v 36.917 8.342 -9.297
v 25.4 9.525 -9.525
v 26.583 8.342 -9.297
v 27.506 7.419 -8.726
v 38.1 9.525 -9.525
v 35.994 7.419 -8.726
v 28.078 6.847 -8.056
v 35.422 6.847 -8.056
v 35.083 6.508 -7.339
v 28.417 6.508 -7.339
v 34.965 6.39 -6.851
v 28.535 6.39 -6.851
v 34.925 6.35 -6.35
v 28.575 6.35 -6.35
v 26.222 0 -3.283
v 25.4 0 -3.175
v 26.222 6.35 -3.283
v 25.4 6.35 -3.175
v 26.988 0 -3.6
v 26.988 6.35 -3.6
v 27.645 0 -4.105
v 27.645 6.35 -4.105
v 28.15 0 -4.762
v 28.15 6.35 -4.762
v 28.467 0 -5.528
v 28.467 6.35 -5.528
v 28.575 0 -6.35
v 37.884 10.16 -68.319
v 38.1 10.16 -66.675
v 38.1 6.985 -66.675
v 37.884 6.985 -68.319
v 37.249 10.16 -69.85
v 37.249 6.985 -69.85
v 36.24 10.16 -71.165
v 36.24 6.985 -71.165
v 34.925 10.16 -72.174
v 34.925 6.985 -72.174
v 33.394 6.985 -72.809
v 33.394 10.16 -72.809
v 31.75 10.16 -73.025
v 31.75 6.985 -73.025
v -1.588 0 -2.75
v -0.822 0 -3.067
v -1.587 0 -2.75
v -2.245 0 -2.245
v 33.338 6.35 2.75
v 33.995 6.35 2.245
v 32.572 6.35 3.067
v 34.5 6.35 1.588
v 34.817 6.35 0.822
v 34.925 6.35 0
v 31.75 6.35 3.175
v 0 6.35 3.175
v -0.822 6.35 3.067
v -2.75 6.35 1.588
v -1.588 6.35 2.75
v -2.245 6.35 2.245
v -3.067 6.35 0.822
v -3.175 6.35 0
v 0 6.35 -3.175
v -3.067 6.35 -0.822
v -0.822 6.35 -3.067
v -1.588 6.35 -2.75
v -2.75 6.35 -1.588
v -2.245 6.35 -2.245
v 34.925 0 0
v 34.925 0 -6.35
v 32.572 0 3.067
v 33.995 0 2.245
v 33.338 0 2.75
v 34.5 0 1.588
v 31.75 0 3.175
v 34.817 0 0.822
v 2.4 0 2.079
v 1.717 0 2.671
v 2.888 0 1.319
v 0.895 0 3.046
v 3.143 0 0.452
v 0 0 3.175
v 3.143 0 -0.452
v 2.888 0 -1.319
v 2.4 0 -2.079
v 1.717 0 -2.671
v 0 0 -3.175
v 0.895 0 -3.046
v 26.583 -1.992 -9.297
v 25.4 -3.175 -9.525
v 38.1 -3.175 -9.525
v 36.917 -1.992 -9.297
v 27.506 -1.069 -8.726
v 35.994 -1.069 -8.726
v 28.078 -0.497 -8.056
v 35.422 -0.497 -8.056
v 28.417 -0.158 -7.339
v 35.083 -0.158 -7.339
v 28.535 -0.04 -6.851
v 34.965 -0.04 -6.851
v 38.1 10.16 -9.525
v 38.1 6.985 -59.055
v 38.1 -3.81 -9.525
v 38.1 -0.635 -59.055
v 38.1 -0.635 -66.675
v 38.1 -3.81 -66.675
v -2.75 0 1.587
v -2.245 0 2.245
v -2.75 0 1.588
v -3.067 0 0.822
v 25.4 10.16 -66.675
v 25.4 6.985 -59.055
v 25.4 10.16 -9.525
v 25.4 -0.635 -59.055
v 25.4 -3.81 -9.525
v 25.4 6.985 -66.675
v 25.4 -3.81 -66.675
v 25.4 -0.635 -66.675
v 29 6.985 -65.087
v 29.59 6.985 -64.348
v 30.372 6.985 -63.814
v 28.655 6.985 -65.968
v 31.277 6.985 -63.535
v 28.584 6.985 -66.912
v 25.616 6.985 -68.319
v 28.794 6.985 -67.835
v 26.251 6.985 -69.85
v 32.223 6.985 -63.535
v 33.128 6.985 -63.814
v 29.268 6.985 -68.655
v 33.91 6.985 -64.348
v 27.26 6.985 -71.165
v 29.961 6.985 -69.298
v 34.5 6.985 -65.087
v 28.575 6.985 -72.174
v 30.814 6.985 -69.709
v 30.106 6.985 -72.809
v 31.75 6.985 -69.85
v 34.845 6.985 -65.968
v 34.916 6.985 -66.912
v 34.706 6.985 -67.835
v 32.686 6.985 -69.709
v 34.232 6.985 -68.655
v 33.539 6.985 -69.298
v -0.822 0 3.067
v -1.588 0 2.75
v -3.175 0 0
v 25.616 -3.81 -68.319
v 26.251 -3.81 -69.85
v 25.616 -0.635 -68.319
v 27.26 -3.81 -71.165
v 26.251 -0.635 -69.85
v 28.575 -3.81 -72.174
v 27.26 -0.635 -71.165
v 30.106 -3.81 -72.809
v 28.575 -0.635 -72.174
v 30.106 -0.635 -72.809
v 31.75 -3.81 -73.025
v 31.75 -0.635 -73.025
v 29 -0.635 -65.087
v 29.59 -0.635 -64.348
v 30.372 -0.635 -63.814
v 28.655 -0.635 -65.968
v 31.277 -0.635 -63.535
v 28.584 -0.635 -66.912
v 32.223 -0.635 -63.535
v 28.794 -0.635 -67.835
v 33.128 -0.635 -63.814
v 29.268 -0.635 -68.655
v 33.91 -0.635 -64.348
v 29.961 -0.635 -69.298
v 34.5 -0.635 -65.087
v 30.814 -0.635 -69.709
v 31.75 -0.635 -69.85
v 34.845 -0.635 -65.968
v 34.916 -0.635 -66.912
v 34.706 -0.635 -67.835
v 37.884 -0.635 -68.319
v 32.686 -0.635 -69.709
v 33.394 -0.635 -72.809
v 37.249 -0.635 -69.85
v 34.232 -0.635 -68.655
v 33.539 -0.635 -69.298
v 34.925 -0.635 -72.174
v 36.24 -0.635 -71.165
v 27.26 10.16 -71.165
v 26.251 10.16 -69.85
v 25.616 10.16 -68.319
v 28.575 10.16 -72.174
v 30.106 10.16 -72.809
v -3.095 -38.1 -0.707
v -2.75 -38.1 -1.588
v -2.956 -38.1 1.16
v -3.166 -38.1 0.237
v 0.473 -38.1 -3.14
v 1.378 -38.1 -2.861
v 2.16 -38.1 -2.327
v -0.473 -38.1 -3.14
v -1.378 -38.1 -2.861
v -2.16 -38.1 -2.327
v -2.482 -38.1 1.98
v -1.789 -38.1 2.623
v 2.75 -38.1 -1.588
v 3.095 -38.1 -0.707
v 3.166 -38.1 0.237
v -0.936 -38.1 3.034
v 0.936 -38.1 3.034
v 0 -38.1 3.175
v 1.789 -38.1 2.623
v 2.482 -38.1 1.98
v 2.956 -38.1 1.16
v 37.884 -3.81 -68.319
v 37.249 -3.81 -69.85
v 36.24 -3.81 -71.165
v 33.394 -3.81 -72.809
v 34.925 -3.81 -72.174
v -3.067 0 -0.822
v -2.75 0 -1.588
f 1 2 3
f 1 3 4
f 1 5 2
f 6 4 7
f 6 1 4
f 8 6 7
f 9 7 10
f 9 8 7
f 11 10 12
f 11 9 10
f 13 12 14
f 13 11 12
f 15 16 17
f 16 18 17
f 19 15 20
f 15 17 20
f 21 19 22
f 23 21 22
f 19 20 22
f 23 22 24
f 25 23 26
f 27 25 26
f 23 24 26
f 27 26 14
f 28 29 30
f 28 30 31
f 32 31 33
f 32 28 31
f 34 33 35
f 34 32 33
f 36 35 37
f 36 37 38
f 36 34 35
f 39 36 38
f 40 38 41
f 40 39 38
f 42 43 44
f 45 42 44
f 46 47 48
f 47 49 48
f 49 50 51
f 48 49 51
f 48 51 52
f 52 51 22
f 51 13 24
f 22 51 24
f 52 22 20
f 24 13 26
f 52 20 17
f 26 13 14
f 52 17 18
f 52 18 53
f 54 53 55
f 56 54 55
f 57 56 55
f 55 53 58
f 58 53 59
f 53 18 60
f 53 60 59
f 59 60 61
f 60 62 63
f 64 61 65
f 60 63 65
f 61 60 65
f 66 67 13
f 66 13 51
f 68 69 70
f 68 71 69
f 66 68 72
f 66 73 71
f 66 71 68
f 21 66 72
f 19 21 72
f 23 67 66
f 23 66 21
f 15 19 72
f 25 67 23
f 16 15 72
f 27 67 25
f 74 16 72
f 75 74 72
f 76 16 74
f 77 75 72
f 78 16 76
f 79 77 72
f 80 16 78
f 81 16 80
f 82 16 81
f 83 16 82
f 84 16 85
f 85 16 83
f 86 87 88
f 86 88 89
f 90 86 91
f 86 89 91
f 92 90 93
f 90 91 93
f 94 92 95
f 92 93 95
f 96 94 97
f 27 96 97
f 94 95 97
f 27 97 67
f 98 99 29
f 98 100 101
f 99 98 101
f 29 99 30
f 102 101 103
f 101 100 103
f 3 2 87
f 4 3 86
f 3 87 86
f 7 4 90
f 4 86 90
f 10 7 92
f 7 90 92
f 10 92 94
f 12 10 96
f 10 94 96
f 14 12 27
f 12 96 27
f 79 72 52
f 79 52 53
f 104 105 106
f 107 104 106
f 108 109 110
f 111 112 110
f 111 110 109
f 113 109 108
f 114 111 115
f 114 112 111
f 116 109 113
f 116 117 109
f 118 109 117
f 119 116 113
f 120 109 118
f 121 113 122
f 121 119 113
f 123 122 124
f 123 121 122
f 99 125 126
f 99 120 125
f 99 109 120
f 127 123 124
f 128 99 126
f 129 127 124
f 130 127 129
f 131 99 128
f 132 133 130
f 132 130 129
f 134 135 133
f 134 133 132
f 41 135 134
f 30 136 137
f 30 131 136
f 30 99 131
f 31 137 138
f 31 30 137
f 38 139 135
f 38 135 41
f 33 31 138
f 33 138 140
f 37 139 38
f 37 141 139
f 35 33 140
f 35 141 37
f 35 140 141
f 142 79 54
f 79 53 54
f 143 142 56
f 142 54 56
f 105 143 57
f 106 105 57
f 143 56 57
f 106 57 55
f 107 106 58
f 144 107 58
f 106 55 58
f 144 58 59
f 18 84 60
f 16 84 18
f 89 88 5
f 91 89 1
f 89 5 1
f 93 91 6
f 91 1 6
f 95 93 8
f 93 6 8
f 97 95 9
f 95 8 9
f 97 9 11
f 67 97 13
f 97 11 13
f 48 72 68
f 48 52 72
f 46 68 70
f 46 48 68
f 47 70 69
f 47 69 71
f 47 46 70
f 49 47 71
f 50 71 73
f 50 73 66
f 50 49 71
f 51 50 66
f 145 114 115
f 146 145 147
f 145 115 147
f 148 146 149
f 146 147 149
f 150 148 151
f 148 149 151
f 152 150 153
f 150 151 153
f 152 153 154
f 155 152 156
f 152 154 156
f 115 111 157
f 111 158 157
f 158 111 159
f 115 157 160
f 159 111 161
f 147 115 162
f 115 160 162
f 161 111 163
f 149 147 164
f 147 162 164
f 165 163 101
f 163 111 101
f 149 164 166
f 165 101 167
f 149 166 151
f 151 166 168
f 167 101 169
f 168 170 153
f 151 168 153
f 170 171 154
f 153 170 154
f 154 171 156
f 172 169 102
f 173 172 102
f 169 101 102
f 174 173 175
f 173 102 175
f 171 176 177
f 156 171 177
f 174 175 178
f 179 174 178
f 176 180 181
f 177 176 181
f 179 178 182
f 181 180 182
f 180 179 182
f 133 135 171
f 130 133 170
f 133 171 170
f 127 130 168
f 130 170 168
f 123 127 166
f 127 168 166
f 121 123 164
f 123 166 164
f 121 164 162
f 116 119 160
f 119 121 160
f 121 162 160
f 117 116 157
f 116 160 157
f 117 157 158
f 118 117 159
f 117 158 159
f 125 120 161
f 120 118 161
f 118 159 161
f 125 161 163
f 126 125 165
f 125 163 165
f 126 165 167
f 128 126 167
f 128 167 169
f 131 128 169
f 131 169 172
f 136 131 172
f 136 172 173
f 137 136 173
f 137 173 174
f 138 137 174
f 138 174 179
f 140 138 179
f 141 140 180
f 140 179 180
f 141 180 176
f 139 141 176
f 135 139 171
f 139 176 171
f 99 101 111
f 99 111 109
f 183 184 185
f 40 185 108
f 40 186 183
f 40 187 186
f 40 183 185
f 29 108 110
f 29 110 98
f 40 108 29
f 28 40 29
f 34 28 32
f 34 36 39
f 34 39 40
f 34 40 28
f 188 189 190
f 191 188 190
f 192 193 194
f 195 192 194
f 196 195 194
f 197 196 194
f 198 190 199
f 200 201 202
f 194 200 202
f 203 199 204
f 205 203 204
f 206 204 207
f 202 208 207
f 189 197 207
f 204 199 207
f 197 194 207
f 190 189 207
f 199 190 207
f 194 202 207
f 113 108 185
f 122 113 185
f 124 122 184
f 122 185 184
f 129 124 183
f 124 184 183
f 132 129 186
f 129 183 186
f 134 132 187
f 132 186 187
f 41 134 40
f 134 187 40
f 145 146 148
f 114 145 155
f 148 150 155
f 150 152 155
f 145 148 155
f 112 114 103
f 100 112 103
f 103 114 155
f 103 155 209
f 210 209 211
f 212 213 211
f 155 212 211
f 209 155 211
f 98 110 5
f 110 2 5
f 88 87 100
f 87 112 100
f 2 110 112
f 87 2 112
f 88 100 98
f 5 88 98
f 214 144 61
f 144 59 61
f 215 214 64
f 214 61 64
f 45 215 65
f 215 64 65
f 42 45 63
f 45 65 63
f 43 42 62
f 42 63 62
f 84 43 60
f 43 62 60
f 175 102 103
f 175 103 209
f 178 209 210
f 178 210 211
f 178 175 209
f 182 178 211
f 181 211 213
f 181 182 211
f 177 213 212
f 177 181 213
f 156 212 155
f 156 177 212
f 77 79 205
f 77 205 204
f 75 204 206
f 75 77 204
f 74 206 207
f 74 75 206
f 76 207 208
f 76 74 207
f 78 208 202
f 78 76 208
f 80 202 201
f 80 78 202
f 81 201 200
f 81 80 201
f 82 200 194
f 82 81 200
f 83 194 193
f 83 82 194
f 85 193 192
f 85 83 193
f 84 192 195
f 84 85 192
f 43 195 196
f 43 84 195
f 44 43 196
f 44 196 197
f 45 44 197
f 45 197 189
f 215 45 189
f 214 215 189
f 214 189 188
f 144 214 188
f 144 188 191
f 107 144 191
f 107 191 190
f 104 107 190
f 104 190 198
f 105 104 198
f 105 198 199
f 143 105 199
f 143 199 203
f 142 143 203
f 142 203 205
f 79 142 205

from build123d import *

# Parameters (mm, degrees)
SKETCH1_R                = 3.175
BOSS_EXTRUDE1_DEPTH      = 38.1
BOSS_EXTRUDE2_DEPTH      = 6.35
FILLET1_R                = 3.175
BOSS_EXTRUDE3_DEPTH      = 3.81
BOSS_EXTRUDE3_DEPTH_BACK = 10.16
SKETCH3_W                = 12.7
SKETCH3_H                = 63.5
FILLET2_R                = 3.175
FILLET3_R                = 6.35
CUT_EXTRUDE1_REACH       = 94.13
SKETCH4_W                = 15.24
SKETCH4_H                = 7.62
SKETCH5_R                = 3.175
BOSS_EXTRUDE4_DEPTH      = 10.16


with BuildPart() as part:
    # Sketch1 → Boss-Extrude1 (new body)
    with BuildSketch(Plane(origin=(0, 0, 0), x_dir=(1, 0, 0), z_dir=(0, 1, 0))):
        with Locations(Location((0, 0, 0), (0, 0, 270))):
            Circle(SKETCH1_R)
    extrude(amount=-BOSS_EXTRUDE1_DEPTH)

    # Sketch2 → Boss-Extrude2 (add)
    with BuildSketch(Plane(origin=(0, 0, 0), x_dir=(1, 0, 0), z_dir=(0, 1, 0))):
        Polygon((34.925, -3.175), (-3.175, -3.175), (-3.175, 3.175), (28.575, 3.175), (28.575, 60.325), (34.925, 60.325), align=None)
    extrude(amount=BOSS_EXTRUDE2_DEPTH)

    # Fillet1
    fillet1_edges = [part.edges().sort_by_distance(p)[0] for p in [
        (28.575, 3.175, -3.175),
        (34.925, 3.175, 3.175),
        (-3.175, 3.175, -3.175),
        (-3.175, 3.175, 3.175),
    ]]
    fillet(fillet1_edges, radius=FILLET1_R - 0.0001)  # a hair under: the kernel refuses the full size

    # Sketch3 → Boss-Extrude3 (add, two sides: drawn at the far end of the back side and taken through both)
    with BuildSketch(Plane(origin=(0, 6.35, 0), x_dir=(1, 0, 0), z_dir=(0, 1, 0)).offset(-BOSS_EXTRUDE3_DEPTH_BACK)):
        with Locations((31.75, 41.275)):
            Rectangle(SKETCH3_W, SKETCH3_H)
    extrude(amount=BOSS_EXTRUDE3_DEPTH + BOSS_EXTRUDE3_DEPTH_BACK)

    # Fillet2
    fillet2_edges = [part.edges().sort_by_distance(p)[0] for p in [
        (28.575, 3.175, -9.525),
        (31.75, 0, -9.525),
        (34.925, 3.175, -9.525),
        (31.75, 6.35, -9.525),
    ]]
    fillet(fillet2_edges, radius=FILLET2_R - 0.0001)  # a hair under: the kernel refuses the full size

    # Fillet3
    fillet3_edges = [part.edges().sort_by_distance(p)[0] for p in [
        (25.4, 3.175, -73.025),
        (38.1, 3.175, -73.025),
    ]]
    fillet(fillet3_edges, radius=FILLET3_R - 0.0001)  # a hair under: the kernel refuses the full size

    # Sketch4 → Cut-Extrude1 (cut, up to next)
    with BuildSketch(Plane(origin=(38.1, 0, 0), x_dir=(0, 0, -1), z_dir=(1, 0, 0)), mode=Mode.PRIVATE) as cut_extrude1_sk1:
        with Locations((66.675, 3.175)):
            Rectangle(SKETCH4_W, SKETCH4_H)
    cut_extrude1_tool1 = extrude(cut_extrude1_sk1.sketch, amount=-CUT_EXTRUDE1_REACH, mode=Mode.PRIVATE) & part.part
    add(cut_extrude1_tool1.solids().sort_by_distance((38.1, 3.175, -66.675))[0], mode=Mode.SUBTRACT)

    # Sketch5 → Boss-Extrude4 (add)
    with BuildSketch(Plane(origin=(0, -0.635, 0), x_dir=(1, 0, 0), z_dir=(0, 1, 0))):
        with Locations(Location((31.75, 66.675, 0), (0, 0, 90))):
            Circle(SKETCH5_R)
    extrude(amount=BOSS_EXTRUDE4_DEPTH)


solid = part.part
